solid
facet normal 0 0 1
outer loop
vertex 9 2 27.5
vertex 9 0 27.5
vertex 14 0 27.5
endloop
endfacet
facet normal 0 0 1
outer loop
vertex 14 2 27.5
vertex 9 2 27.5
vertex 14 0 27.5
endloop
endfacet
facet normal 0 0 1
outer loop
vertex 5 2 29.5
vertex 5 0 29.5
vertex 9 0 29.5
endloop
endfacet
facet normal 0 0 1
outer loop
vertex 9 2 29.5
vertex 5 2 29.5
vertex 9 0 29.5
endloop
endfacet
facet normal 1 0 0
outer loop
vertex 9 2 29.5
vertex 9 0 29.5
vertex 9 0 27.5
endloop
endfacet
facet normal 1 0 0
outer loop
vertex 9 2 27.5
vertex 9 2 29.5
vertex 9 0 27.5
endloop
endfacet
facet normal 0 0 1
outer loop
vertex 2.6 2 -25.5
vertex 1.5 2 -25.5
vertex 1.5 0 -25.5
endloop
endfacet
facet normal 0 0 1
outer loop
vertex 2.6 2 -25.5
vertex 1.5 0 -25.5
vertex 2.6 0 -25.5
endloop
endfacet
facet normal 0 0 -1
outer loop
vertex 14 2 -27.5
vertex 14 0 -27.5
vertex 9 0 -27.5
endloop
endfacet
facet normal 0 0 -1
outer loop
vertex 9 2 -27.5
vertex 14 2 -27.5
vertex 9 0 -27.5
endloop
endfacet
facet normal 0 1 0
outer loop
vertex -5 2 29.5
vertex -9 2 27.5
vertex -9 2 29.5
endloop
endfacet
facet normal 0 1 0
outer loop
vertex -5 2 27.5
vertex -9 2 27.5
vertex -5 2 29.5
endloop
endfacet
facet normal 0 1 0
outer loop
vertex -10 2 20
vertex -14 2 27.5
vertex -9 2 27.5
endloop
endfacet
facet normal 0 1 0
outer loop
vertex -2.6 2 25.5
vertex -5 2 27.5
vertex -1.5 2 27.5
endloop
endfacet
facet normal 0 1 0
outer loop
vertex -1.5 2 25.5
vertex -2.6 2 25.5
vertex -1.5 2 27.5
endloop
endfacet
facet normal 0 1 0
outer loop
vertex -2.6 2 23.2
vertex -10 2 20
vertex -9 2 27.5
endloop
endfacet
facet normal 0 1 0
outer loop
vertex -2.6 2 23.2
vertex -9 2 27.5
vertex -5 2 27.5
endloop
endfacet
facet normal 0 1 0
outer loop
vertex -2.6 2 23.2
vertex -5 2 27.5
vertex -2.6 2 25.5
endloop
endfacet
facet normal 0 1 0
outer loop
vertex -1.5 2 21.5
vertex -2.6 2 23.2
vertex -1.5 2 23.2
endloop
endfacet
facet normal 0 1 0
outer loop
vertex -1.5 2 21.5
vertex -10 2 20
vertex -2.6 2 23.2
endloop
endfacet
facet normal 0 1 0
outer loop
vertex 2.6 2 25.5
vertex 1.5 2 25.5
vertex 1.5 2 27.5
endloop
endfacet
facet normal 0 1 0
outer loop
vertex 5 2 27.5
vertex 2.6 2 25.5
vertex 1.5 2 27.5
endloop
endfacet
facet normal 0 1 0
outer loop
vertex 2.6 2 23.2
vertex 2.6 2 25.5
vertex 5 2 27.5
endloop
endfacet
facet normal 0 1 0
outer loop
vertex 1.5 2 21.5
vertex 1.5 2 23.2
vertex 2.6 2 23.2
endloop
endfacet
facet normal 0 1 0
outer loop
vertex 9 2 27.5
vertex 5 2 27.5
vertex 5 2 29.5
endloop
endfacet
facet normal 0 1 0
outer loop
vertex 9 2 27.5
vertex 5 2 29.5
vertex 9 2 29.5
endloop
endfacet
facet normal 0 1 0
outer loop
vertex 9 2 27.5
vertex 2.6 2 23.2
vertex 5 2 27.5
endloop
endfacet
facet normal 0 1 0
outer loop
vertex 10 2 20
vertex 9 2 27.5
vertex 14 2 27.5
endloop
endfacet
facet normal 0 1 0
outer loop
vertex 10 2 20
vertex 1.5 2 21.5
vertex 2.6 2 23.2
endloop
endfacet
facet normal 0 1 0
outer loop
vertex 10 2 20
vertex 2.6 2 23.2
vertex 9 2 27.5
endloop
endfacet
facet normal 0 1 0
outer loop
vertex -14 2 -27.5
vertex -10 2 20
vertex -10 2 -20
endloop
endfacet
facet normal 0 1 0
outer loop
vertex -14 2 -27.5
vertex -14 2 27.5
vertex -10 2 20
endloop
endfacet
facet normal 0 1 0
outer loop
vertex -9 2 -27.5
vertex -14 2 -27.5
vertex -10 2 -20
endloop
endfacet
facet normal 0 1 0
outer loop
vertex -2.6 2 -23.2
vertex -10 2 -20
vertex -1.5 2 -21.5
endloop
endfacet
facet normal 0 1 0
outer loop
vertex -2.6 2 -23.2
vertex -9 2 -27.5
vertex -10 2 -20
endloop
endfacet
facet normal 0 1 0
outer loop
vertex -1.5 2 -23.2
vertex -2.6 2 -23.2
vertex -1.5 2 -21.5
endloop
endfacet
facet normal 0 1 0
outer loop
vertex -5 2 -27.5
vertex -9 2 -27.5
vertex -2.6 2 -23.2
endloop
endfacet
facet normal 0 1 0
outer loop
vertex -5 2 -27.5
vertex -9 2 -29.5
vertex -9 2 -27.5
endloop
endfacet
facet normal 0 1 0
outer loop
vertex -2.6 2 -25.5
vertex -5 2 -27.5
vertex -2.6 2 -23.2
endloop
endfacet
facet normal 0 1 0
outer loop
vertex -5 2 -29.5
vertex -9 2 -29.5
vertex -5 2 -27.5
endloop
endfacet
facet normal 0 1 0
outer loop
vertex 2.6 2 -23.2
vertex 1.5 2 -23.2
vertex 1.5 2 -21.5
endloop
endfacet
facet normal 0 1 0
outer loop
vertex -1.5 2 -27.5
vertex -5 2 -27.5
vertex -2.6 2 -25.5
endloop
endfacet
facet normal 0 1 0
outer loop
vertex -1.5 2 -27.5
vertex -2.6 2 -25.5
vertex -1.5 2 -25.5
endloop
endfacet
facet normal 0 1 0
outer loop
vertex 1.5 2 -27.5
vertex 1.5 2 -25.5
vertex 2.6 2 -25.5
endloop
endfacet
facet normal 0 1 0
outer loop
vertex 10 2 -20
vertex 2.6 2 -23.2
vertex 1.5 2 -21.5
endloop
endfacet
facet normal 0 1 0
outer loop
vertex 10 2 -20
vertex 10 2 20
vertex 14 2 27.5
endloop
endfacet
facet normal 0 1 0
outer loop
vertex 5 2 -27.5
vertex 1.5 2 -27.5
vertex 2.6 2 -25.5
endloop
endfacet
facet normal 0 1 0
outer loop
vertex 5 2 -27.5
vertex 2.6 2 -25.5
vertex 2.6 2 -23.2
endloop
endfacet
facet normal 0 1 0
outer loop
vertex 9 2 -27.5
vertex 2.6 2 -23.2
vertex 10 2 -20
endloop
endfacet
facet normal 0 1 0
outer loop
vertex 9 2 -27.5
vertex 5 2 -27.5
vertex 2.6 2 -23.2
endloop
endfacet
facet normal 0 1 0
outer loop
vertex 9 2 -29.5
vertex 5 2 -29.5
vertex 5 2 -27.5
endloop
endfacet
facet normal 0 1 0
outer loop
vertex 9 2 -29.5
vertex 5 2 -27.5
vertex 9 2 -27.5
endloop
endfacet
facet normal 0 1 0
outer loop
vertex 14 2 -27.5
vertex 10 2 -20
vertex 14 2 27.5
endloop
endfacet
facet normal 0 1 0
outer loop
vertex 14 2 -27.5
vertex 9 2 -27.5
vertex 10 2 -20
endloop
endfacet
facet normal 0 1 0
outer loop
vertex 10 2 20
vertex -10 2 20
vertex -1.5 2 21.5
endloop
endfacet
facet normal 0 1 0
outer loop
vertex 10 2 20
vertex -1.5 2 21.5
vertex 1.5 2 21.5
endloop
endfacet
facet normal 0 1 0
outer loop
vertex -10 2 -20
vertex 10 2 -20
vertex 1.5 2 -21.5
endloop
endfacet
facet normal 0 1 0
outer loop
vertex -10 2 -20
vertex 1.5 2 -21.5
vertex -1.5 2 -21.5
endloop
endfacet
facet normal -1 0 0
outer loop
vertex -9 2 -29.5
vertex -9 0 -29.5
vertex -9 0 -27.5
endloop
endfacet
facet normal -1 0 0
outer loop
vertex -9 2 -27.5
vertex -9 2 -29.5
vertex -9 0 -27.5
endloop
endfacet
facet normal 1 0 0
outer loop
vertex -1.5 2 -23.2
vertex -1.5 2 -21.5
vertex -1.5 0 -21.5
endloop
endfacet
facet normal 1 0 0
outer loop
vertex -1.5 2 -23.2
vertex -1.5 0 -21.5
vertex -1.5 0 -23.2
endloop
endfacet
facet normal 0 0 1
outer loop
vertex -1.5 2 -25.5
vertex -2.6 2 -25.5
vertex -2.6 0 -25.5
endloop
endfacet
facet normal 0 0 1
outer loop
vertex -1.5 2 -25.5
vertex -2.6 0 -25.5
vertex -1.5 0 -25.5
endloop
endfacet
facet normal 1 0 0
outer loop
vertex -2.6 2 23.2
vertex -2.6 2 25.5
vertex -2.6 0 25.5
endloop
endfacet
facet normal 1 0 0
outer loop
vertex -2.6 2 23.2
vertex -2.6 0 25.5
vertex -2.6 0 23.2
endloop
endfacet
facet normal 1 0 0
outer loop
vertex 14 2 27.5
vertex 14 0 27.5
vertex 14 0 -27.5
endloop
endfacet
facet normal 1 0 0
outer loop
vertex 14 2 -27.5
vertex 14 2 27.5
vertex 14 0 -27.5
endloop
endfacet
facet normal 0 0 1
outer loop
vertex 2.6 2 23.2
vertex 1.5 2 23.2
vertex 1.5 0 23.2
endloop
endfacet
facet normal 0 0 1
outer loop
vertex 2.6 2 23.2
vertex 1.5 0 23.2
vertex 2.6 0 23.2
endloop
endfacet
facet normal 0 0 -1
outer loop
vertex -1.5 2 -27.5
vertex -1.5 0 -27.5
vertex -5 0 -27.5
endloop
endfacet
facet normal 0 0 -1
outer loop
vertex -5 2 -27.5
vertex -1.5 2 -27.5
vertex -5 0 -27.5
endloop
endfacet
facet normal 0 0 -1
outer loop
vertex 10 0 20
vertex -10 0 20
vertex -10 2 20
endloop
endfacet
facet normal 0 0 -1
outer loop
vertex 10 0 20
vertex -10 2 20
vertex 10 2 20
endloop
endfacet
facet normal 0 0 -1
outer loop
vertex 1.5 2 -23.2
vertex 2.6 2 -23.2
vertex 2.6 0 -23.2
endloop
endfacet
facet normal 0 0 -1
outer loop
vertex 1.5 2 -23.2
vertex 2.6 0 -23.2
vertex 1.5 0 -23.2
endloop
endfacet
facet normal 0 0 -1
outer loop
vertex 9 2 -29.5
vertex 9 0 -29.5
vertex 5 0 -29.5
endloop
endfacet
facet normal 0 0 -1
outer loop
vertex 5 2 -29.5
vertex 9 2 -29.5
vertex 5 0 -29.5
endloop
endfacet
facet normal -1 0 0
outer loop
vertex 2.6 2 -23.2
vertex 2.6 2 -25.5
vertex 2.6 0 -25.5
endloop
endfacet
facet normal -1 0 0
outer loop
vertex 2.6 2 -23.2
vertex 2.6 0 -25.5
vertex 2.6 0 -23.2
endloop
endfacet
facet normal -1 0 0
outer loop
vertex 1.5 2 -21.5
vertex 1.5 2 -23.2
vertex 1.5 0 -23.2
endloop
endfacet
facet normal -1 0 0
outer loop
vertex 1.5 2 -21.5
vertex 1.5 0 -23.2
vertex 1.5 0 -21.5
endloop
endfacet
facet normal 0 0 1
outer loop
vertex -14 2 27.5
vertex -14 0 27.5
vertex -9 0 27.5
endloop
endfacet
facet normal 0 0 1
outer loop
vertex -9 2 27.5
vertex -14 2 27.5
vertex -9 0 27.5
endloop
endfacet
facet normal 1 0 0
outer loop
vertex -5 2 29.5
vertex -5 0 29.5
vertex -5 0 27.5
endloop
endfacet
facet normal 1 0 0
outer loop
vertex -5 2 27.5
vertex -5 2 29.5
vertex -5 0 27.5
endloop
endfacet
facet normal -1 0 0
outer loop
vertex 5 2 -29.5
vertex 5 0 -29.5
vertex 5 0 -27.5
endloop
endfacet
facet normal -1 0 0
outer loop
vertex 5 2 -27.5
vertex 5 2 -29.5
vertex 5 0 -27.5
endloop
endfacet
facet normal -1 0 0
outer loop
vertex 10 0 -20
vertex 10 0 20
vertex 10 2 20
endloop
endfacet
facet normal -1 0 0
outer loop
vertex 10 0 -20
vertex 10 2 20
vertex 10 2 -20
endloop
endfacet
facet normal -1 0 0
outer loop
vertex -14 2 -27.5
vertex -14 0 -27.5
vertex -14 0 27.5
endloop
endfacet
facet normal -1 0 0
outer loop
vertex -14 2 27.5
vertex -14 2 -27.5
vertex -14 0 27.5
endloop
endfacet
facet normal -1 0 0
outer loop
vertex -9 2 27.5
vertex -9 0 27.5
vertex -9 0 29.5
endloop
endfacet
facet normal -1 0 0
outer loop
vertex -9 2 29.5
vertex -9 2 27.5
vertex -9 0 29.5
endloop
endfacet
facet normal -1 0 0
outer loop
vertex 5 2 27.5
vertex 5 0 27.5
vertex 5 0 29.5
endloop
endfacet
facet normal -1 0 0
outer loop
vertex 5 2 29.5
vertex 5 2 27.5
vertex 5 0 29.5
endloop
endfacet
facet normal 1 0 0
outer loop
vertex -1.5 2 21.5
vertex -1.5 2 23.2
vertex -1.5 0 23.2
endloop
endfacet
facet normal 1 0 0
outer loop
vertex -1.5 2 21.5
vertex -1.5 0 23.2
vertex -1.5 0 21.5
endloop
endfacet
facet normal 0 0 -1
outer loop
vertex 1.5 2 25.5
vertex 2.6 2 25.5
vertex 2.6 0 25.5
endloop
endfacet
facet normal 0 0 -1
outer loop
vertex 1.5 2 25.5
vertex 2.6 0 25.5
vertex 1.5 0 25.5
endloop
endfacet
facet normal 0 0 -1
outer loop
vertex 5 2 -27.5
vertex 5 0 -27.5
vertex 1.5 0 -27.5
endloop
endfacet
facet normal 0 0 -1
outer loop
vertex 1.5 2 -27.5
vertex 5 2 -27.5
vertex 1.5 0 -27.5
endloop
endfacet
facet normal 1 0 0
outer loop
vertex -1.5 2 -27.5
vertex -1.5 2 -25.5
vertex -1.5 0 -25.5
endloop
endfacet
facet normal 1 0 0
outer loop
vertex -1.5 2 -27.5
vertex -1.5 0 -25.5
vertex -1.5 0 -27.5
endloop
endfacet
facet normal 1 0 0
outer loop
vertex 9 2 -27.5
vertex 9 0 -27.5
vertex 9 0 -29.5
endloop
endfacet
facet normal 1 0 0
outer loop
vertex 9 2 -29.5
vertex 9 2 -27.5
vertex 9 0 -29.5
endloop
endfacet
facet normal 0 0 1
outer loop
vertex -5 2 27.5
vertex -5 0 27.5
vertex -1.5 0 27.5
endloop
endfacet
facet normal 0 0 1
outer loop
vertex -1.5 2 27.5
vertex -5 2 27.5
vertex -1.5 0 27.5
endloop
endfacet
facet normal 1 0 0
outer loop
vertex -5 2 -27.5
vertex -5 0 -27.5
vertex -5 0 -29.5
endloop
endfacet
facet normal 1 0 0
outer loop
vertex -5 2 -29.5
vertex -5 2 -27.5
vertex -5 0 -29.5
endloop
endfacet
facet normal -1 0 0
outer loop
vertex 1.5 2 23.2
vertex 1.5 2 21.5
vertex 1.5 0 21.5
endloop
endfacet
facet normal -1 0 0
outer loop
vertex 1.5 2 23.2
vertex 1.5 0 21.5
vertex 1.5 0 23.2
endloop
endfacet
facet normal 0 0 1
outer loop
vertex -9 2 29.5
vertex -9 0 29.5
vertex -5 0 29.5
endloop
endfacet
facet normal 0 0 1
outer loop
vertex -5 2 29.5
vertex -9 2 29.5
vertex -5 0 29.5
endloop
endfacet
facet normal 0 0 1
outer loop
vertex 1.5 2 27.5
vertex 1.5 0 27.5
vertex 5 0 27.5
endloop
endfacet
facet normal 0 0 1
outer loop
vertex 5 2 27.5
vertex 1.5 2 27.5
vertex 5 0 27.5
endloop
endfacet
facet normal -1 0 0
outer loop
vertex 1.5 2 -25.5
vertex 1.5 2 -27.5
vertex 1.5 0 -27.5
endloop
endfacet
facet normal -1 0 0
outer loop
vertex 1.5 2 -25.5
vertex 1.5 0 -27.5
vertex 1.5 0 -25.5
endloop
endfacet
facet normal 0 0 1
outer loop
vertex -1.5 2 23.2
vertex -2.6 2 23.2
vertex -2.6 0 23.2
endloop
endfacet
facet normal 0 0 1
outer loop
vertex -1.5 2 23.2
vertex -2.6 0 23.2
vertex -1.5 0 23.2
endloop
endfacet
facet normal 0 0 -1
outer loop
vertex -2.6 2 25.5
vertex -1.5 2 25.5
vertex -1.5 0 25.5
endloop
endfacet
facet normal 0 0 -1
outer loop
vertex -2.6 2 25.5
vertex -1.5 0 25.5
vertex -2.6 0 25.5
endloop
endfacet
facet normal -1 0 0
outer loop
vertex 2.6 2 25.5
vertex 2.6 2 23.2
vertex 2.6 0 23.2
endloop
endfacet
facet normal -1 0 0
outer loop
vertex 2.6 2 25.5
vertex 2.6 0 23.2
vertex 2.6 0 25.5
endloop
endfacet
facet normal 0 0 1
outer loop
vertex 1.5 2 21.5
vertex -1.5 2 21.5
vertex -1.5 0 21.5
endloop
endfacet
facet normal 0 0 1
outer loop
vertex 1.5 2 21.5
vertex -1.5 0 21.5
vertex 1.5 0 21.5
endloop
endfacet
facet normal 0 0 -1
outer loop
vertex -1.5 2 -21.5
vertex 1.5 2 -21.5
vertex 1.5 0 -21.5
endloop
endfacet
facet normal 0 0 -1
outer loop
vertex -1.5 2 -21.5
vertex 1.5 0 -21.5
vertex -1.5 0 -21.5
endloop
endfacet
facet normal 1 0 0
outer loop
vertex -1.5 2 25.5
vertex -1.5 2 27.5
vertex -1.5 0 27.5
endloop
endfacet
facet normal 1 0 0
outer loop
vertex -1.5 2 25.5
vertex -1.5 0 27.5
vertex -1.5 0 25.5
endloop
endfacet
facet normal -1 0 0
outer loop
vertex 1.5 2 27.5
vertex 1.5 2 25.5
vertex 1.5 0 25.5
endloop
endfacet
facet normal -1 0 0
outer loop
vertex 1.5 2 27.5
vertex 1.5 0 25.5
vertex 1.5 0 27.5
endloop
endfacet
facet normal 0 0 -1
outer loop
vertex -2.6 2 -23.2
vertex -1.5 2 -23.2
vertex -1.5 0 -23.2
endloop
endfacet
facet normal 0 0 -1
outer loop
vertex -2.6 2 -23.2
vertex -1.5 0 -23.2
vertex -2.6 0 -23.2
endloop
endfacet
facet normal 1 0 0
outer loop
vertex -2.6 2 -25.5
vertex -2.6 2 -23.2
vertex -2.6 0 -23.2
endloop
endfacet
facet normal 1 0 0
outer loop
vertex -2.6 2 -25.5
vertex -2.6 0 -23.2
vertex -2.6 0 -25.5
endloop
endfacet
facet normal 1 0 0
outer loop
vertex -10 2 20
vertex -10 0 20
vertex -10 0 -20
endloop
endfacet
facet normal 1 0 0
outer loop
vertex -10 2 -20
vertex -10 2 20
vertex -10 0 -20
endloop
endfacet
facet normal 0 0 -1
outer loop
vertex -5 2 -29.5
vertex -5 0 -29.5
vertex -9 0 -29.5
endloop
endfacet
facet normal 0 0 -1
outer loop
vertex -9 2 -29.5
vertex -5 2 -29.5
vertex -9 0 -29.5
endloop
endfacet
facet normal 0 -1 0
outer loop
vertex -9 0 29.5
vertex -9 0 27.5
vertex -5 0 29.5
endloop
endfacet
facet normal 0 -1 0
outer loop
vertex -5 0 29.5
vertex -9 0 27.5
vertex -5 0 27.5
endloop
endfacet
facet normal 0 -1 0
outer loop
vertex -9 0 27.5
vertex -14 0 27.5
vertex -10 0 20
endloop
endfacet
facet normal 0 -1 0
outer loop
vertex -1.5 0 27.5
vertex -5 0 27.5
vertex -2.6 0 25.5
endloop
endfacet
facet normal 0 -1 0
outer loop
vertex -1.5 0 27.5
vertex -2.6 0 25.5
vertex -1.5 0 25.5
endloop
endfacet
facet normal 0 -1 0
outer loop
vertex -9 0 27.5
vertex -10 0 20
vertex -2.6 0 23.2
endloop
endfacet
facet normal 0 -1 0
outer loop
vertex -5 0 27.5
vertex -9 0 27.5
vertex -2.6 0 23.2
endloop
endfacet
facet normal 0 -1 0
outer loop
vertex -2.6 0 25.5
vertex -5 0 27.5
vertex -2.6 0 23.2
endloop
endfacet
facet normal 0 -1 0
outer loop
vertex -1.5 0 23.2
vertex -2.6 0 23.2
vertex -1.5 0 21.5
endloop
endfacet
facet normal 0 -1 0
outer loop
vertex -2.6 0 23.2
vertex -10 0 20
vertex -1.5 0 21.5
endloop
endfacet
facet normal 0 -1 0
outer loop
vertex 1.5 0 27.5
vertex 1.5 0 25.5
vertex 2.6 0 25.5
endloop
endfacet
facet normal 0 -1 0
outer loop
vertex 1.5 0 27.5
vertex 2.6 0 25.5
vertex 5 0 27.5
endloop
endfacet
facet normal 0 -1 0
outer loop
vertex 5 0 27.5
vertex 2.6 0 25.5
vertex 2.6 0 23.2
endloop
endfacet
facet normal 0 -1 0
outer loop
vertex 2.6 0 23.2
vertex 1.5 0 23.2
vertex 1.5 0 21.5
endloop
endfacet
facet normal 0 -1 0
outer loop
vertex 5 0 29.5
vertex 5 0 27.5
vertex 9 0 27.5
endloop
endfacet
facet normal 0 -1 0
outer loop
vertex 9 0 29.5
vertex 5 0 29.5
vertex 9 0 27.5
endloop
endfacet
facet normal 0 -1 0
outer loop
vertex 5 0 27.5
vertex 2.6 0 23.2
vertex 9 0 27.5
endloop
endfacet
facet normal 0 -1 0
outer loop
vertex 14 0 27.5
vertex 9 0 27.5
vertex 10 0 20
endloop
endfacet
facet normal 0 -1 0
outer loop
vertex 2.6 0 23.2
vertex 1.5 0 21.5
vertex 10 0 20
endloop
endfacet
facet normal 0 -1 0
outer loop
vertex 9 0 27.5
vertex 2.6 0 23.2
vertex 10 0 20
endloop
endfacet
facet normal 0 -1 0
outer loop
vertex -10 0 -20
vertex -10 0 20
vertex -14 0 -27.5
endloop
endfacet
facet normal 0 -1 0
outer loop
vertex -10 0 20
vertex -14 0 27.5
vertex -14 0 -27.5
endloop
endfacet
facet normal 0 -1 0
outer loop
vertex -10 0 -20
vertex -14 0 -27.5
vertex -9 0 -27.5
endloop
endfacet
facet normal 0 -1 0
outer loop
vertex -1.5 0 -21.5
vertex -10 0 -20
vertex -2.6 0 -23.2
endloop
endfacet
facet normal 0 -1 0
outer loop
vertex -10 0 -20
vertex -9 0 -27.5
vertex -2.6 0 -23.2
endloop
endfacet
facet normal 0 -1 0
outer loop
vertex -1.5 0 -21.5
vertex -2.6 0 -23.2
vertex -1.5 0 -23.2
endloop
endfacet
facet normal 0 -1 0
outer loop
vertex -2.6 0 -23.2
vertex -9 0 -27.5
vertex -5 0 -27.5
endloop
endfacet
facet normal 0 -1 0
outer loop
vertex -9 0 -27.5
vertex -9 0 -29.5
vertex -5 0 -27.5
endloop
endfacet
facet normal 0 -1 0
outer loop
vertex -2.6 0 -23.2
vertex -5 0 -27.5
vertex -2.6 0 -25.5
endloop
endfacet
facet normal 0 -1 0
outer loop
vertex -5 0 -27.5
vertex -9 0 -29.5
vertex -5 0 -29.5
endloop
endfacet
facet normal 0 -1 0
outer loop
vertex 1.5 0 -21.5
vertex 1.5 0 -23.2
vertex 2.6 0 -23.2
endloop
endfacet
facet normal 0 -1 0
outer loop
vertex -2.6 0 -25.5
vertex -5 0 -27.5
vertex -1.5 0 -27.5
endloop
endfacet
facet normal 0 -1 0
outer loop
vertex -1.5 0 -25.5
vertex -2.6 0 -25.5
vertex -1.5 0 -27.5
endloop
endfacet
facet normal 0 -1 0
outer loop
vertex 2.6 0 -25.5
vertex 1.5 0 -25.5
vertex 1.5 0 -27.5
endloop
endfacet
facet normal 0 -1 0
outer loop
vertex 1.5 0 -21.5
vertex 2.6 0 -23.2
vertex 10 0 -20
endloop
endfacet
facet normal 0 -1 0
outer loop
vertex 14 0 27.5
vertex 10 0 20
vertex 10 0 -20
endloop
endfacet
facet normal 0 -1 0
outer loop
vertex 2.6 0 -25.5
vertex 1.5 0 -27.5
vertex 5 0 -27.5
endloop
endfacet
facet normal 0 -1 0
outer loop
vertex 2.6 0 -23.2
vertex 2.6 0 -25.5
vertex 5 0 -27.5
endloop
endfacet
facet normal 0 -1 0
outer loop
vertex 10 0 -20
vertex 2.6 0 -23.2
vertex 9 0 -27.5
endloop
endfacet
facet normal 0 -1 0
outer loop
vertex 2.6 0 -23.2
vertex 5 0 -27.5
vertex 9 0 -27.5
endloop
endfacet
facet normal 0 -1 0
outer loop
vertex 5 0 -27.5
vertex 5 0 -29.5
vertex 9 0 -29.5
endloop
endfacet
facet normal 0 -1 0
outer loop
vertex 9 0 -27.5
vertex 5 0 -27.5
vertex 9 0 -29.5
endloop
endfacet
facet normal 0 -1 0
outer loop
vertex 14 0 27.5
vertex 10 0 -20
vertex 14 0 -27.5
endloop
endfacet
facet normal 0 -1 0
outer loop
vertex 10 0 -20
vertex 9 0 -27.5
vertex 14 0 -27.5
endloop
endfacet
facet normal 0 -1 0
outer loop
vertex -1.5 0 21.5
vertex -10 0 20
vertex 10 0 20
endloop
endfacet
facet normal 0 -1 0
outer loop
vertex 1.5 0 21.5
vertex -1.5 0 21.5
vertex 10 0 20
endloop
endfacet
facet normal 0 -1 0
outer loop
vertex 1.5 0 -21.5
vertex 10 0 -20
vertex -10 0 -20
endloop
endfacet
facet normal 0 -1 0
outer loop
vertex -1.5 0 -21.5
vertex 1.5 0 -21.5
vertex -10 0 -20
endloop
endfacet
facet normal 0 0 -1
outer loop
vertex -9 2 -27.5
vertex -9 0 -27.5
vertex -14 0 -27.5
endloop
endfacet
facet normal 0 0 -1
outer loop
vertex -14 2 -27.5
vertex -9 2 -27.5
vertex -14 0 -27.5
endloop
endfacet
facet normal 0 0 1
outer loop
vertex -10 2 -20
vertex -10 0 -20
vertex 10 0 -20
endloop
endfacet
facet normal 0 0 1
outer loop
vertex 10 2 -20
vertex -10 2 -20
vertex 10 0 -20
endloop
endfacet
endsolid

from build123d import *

# Parameters (mm, degrees)
SKETCH1_W           = 20
SKETCH1_H           = 40
BOSS_EXTRUDE1_DEPTH = 2
CUT_EXTRUDE2_DEPTH  = 2


with BuildPart() as part:
    # Sketch1 → Boss-Extrude1 (new body)
    with BuildSketch(Plane(origin=(0, 0, 0), x_dir=(1, 0, 0), z_dir=(0, 1, 0))):
        Polygon((-14, -27.5), (-9, -27.5), (-9, -29.5), (-5, -29.5), (-5, -27.5), (5, -27.5), (5, -29.5), (9, -29.5), (9, -27.5), (14, -27.5), (14, 27.5), (9, 27.5), (9, 29.5), (5, 29.5), (5, 27.5), (-5, 27.5), (-5, 29.5), (-9, 29.5), (-9, 27.5), (-14, 27.5), (-14, 14.5), (-14, -14.5), align=None)
        Rectangle(SKETCH1_W, SKETCH1_H, mode=Mode.SUBTRACT)
    extrude(amount=BOSS_EXTRUDE1_DEPTH)

    # Sketch4 → Cut-Extrude2 (cut)
    with BuildSketch(Plane(origin=(0, 2, 0), x_dir=(1, 0, 0), z_dir=(0, 1, 0))):
        Polygon((-1.5, 23.2), (-2.6, 23.2), (-2.6, 25.5), (-1.5, 25.5), (-1.5, 27.5), (1.5, 27.5), (1.5, 25.5), (2.6, 25.5), (2.6, 23.2), (1.5, 23.2), (1.5, 21.5), (-1.5, 21.5), align=None)
        Polygon((1.5, -25.5), (1.5, -27.5), (-1.5, -27.5), (-1.5, -25.5), (-2.6, -25.5), (-2.6, -23.2), (-1.5, -23.2), (-1.5, -21.5), (1.5, -21.5), (1.5, -23.2), (2.6, -23.2), (2.6, -25.5), align=None)
    extrude(amount=-CUT_EXTRUDE2_DEPTH, mode=Mode.SUBTRACT)


solid = part.part
